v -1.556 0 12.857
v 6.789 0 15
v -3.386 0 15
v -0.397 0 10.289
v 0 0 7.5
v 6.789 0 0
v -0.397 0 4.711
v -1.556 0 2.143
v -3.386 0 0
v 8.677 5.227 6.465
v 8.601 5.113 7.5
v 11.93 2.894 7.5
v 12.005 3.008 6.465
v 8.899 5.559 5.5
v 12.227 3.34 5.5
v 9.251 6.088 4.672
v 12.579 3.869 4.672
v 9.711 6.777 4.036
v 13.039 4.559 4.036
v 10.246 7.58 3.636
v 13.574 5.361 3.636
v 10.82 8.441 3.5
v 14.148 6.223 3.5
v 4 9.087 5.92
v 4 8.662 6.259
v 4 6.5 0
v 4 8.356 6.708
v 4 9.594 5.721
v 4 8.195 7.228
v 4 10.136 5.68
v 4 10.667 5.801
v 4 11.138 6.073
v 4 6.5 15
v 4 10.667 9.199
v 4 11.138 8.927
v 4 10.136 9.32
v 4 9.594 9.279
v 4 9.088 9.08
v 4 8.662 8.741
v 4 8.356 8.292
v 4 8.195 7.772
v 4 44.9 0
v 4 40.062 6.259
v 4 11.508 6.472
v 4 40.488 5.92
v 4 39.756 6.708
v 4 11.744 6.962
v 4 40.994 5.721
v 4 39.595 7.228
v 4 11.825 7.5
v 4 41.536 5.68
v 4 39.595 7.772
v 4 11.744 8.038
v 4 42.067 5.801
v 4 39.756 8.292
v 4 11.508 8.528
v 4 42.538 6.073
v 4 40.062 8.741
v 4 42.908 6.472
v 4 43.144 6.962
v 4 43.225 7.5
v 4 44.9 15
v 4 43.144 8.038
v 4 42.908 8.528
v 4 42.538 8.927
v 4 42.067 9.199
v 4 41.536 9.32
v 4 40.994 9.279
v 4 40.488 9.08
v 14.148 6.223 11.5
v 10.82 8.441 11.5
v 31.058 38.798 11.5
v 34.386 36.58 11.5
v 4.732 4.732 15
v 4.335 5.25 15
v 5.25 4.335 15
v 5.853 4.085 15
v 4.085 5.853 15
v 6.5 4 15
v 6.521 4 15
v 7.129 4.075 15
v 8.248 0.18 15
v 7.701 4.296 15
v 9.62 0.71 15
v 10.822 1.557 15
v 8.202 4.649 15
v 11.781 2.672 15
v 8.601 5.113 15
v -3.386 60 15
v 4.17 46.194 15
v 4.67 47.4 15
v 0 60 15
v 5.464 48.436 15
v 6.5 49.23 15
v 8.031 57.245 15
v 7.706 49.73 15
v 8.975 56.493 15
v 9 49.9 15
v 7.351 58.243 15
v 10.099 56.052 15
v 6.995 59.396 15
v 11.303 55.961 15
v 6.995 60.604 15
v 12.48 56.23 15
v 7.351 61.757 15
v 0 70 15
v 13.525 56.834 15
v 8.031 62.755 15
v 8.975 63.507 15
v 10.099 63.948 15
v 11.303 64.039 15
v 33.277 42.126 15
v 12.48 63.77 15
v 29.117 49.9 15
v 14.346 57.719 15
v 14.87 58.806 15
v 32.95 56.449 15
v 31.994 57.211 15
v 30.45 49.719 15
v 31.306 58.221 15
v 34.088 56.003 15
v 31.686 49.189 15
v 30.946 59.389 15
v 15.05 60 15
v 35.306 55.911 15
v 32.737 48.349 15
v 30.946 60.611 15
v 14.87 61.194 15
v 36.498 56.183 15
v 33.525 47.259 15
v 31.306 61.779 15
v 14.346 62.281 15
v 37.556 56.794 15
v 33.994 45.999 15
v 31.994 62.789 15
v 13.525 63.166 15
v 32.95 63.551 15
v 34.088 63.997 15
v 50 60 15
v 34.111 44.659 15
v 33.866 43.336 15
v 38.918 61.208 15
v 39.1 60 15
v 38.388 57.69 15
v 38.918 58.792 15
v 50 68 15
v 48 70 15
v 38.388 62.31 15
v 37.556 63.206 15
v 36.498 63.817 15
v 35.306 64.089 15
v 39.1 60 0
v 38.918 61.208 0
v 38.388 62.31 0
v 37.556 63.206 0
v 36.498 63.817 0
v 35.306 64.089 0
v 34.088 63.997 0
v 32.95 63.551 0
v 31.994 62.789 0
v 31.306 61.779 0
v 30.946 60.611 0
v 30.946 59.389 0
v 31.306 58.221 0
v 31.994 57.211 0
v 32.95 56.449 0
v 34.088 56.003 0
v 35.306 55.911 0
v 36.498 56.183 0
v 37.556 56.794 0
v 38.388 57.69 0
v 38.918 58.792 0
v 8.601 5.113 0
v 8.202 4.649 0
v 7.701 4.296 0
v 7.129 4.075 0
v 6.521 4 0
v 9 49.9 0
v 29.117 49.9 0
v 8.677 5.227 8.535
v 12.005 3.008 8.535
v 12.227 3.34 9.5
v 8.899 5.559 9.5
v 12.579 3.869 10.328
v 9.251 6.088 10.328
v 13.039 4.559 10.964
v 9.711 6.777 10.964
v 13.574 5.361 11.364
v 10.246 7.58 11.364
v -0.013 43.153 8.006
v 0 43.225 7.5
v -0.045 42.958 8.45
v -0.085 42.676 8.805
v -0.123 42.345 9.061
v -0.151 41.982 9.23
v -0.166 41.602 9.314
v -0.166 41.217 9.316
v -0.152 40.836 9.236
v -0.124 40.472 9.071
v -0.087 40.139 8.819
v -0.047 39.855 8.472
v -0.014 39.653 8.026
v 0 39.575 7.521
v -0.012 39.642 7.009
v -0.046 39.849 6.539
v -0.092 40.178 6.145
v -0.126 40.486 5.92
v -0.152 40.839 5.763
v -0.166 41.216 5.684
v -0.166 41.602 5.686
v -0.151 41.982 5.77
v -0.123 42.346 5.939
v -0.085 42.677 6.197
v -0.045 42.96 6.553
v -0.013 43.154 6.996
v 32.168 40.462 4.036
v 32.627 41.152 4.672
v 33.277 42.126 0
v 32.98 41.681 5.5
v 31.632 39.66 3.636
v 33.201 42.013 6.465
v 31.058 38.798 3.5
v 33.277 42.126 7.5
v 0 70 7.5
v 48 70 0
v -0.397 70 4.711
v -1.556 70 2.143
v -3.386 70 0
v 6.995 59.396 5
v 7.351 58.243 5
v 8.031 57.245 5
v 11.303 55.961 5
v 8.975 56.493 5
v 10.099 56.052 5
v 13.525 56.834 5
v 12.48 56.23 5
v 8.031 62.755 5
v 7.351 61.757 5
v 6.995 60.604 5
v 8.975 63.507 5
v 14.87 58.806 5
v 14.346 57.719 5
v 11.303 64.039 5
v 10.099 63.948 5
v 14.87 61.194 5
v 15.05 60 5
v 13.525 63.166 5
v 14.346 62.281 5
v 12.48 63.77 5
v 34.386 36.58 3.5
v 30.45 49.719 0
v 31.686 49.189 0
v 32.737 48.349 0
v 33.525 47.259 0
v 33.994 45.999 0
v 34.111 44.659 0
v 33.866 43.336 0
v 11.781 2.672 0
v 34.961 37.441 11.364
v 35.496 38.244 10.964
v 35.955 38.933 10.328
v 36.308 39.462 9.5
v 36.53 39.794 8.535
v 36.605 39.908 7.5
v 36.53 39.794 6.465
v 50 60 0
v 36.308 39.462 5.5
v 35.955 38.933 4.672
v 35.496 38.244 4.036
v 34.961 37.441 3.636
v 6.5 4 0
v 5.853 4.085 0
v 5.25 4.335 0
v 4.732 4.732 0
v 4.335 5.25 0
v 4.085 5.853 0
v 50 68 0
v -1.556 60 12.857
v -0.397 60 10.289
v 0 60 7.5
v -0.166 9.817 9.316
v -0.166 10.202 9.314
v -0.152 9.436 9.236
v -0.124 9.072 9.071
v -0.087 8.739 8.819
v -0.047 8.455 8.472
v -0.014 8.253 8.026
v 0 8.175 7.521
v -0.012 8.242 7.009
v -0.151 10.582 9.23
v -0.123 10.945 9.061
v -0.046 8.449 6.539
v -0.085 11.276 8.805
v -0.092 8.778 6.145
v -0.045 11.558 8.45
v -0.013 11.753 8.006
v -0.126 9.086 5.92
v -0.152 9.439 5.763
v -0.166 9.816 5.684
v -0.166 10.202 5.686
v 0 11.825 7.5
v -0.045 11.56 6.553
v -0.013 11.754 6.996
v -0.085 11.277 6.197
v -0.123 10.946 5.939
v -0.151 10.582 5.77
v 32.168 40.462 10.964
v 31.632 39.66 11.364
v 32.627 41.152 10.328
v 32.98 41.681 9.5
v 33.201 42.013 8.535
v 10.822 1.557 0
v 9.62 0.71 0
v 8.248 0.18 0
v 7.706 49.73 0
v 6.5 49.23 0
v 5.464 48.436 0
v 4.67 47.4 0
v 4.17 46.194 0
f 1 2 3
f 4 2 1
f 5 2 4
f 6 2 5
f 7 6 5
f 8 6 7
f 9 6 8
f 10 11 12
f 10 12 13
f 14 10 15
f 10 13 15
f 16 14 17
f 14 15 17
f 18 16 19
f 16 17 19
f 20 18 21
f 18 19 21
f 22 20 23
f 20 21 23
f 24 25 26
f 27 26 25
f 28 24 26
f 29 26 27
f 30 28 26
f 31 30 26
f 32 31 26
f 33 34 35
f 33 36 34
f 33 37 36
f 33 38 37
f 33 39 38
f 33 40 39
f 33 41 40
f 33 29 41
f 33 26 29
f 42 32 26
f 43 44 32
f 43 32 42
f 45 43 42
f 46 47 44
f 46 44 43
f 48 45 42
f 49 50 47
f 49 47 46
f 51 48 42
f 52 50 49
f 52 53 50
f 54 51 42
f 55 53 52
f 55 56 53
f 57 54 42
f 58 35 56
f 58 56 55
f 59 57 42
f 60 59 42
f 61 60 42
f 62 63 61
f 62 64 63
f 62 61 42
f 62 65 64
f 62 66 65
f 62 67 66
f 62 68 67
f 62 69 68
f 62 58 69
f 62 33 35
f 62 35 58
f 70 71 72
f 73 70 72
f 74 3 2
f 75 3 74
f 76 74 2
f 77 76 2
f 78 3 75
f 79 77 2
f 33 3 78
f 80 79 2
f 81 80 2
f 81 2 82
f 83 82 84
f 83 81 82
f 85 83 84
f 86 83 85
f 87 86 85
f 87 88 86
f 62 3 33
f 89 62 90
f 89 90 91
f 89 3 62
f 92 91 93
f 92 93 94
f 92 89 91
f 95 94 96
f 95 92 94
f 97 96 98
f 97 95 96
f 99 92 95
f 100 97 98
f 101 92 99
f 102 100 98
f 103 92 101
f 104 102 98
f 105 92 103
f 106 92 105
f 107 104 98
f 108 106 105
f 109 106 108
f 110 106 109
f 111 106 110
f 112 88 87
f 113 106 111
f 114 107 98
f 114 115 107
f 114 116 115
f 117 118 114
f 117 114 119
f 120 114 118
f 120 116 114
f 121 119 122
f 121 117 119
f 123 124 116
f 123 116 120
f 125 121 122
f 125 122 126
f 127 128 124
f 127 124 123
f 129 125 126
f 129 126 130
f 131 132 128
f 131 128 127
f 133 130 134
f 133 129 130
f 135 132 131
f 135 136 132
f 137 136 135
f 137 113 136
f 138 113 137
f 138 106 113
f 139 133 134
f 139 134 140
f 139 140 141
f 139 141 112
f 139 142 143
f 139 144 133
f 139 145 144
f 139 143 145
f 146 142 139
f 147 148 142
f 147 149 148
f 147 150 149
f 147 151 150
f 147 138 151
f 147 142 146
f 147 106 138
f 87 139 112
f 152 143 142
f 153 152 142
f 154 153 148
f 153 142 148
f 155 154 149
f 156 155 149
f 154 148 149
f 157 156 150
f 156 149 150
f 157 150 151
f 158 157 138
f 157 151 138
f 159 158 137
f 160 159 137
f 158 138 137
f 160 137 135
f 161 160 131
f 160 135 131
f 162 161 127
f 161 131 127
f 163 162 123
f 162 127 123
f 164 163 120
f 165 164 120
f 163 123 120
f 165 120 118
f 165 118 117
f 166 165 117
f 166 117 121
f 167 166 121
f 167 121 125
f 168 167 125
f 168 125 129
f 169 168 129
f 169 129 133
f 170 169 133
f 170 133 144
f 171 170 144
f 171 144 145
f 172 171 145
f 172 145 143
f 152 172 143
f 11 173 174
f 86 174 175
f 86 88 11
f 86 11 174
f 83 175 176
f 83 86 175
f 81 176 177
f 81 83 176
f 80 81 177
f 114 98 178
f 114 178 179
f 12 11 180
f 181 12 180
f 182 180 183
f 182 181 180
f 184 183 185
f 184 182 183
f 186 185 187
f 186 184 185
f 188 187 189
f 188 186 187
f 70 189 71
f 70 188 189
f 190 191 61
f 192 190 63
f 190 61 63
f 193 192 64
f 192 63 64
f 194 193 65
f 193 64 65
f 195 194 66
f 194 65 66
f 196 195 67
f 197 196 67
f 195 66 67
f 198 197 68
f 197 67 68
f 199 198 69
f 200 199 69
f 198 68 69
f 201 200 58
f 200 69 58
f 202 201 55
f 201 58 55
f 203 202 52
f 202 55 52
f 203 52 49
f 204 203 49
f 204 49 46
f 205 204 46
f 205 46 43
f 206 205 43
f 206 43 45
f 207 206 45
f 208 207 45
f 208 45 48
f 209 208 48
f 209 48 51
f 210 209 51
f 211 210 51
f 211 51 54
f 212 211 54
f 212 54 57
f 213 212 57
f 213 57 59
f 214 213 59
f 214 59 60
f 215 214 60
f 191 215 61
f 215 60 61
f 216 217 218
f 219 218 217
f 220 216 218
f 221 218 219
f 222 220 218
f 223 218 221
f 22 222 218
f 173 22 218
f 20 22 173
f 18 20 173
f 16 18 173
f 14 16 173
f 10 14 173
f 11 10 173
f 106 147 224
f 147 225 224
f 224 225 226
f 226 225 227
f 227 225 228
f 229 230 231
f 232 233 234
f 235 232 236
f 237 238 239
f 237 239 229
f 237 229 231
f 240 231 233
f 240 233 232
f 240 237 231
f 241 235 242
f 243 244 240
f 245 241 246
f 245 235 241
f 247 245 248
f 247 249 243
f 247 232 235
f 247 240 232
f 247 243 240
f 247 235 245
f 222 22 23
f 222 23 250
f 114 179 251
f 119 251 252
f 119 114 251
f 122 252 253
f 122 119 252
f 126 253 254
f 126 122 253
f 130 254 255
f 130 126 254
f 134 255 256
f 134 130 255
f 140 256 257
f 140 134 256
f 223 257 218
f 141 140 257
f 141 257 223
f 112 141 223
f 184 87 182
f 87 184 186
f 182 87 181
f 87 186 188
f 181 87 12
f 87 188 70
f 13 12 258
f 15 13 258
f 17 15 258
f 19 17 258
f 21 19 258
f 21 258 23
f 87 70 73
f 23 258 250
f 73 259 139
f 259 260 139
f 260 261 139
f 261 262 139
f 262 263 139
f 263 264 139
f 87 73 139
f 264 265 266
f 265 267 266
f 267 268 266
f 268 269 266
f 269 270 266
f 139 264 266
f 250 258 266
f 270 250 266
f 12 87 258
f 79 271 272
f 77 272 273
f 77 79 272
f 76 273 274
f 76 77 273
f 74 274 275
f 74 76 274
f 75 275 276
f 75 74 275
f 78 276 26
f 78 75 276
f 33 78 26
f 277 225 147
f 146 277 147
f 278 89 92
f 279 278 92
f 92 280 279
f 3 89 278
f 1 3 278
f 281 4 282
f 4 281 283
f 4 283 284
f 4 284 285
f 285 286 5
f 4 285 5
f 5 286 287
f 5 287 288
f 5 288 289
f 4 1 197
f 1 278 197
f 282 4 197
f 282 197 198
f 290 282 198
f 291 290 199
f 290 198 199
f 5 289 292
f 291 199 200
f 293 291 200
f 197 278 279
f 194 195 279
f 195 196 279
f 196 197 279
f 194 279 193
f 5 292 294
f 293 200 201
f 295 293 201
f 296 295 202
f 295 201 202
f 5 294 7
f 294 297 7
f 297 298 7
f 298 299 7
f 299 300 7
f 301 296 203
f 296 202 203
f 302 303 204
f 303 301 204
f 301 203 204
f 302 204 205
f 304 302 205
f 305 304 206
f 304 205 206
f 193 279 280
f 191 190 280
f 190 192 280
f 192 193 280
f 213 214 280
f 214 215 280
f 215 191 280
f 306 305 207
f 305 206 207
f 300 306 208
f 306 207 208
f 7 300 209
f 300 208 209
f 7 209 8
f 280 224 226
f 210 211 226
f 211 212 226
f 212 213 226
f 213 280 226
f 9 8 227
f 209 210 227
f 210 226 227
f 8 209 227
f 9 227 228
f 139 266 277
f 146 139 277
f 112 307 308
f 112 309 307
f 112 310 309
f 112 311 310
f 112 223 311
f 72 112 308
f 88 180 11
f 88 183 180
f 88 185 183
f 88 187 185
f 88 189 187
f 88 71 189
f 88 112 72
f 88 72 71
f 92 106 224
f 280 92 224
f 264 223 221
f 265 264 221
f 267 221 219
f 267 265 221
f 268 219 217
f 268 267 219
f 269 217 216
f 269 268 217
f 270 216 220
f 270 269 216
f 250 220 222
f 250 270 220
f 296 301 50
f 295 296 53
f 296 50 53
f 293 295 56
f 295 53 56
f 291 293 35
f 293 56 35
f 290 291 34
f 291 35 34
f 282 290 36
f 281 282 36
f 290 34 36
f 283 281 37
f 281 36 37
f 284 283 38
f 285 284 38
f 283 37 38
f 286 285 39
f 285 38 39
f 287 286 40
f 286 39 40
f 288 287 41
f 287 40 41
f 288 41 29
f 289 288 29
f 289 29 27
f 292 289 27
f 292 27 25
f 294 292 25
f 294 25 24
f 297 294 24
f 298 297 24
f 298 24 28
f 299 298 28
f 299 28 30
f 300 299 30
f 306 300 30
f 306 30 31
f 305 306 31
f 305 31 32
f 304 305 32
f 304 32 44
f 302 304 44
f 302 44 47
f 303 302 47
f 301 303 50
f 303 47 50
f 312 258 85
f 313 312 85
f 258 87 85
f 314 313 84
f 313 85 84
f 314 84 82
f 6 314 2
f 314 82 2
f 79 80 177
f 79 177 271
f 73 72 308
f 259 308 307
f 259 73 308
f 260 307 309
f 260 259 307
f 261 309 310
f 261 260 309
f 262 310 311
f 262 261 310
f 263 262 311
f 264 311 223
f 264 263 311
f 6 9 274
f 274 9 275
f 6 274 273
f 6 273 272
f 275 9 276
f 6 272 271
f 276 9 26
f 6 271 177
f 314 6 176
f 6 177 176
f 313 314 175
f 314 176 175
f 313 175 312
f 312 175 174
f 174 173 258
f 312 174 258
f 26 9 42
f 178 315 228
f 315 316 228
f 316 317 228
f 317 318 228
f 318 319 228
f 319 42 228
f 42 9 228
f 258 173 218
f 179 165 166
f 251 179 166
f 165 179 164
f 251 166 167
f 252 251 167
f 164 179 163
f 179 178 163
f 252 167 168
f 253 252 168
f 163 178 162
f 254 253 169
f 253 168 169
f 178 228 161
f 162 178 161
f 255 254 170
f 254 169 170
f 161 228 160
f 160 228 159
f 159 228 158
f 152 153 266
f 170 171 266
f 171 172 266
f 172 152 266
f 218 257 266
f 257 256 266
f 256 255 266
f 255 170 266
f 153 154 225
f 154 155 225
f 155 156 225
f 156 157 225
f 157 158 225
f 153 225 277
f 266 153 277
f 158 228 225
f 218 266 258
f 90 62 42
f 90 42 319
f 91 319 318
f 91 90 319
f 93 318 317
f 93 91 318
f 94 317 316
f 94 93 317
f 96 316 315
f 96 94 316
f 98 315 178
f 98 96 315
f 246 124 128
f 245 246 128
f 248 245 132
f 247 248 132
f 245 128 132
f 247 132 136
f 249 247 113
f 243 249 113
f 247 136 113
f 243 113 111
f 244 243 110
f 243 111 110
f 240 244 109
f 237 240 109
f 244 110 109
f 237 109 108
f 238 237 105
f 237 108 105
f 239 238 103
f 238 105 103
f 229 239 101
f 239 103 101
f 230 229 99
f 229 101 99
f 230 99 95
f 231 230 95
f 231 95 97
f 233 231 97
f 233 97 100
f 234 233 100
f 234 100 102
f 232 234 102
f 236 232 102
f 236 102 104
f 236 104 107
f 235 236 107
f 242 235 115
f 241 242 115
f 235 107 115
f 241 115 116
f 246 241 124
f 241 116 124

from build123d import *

# Parameters (mm, degrees)
P_IDAT_VYSUNUT_M1_DEPTH  = 15
SKICA2_R                 = 4.1
ODEBRAT_VYSUNUT_M1_DEPTH = 88.321245983
SKICA3_R                 = 4.05
ODEBRAT_VYSUNUT_M2_DEPTH = 10
ODEBRAT_VYSUNUT_M3_DEPTH = 88.321245983
P_IDAT_VYSUNUT_M2_DEPTH  = 70
SKICA6_W                 = 3.385621722
SKICA6_H                 = 7.5
ODEBRAT_VYSUNUT_M4_DEPTH = 10
SKICA8_W                 = 8
SKICA8_H                 = 44.48438966
ODEBRAT_VYSUNUT_M5_DEPTH = 88.290898193
ZAOBLIT1_R               = 4
SKICA9_R                 = 1.825
ODEBRAT_VYSUNUT_M6_DEPTH = 86.094065598
ZAOBLIT3_R               = 6
ZKOSEN_1_SIZE            = 2


with BuildPart() as part:
    # Skica1 → Přidat vysunutím1 (new body)
    with BuildSketch(Plane.XY):
        Polygon((0, 0), (10, 0), (50, 60), (50, 70), (0, 70), align=None)
    extrude(amount=P_IDAT_VYSUNUT_M1_DEPTH)

    # Skica2 → Odebrat vysunutím1 (cut, through all)
    with BuildSketch(Plane.XY.offset(15)):
        with Locations((35, 60)):
            Circle(SKICA2_R)
    extrude(amount=-ODEBRAT_VYSUNUT_M1_DEPTH, mode=Mode.SUBTRACT)

    # Skica3 → Odebrat vysunutím2 (cut)
    with BuildSketch(Plane.XY.offset(15)):
        with Locations((11, 60)):
            Circle(SKICA3_R)
    extrude(amount=-ODEBRAT_VYSUNUT_M2_DEPTH, mode=Mode.SUBTRACT)

    # Skica4 → Odebrat vysunutím3 (cut, through all)
    with BuildSketch(Plane.XY.offset(15)):
        with BuildLine():
            Line((9, 49.9), (29.116679507, 49.9))
            ThreePointArc((29.116679507, 49.9), (33.525052501, 47.259289628), (33.276930979, 42.126499019))
            Line((33.276930979, 42.126499019), (8.601431306, 5.113249509))
            ThreePointArc((8.601431306, 5.113249509), (7.700950384, 4.295813503), (6.52130557, 4))
            Line((6.52130557, 4), (6.5, 4))
            ThreePointArc((6.5, 4), (4.732233047, 4.732233047), (4, 6.5))
            Line((4, 6.5), (4, 44.9))
            ThreePointArc((4, 44.9), (5.464466094, 48.435533906), (9, 49.9))
        make_face()
    extrude(amount=-ODEBRAT_VYSUNUT_M3_DEPTH, mode=Mode.SUBTRACT)

    # Skica5 → Přidat vysunutím2 (add)
    with BuildSketch(Plane(origin=(0, 70, 0), x_dir=(1, 0, 0), z_dir=(0, 1, 0))):
        with BuildLine():
            Line((-3.385621722, 0), (3, 0))
            Line((3, 0), (3, -15))
            Line((3, -15), (-3.385621722, -15))
            ThreePointArc((-3.385621722, -15), (0, -7.5), (-3.385621722, 0))
        make_face()
    extrude(amount=-P_IDAT_VYSUNUT_M2_DEPTH)

    # Skica6 → Odebrat vysunutím4 (cut)
    with BuildSketch(Plane(origin=(0, 70, 0), x_dir=(1, 0, 0), z_dir=(0, 1, 0))):
        with Locations((-1.692810861, -11.25)):
            Rectangle(SKICA6_W, SKICA6_H)
    extrude(amount=-ODEBRAT_VYSUNUT_M4_DEPTH, mode=Mode.SUBTRACT)

    # Skica8 → Odebrat vysunutím5 (cut, through all)
    with BuildSketch(Plane(origin=(3.594875746, -2.39658383, 0), x_dir=(0, 0, 1), z_dir=(-0.8320502943378438, 0.5547001962252291, 0))):
        with Locations((7.5, 31.267891222)):
            Rectangle(SKICA8_W, SKICA8_H)
    extrude(amount=-ODEBRAT_VYSUNUT_M5_DEPTH, mode=Mode.SUBTRACT)

    # Zaoblit1
    zaoblit1_edges = [part.edges().sort_by_distance(p)[0] for p in [
        (34.941031567, 41.017098626, 3.5),
        (34.941031567, 41.017098626, 11.5),
        (10.265531894, 4.003849117, 11.5),
        (10.265531894, 4.003849117, 3.5),
    ]]
    fillet(zaoblit1_edges, radius=ZAOBLIT1_R - 0.0001)  # a hair under: the kernel refuses the full size

    # Skica9 → Odebrat vysunutím6 (cut, through all)
    with BuildSketch(Plane(origin=(4, 0, 0), x_dir=(0, 0, -1), z_dir=(1, 0, 0))):
        with Locations(Location((-7.5, 10, 0), (0, 0, 90))):
            Circle(SKICA9_R)
        with Locations(Location((-7.5, 41.4, 0), (0, 0, 90))):
            Circle(SKICA9_R)
    extrude(amount=-ODEBRAT_VYSUNUT_M6_DEPTH, mode=Mode.SUBTRACT)

    # Zaoblit3
    zaoblit3_edges = [part.edges().sort_by_distance(p)[0] for p in [
        (10, 0, 7.5),
    ]]
    fillet(zaoblit3_edges, radius=ZAOBLIT3_R)

    # Zkosení1
    zkosen_1_edges = [part.edges().sort_by_distance(p)[0] for p in [
        (50, 70, 7.5),
    ]]
    chamfer(zkosen_1_edges, length=ZKOSEN_1_SIZE)


solid = part.part
